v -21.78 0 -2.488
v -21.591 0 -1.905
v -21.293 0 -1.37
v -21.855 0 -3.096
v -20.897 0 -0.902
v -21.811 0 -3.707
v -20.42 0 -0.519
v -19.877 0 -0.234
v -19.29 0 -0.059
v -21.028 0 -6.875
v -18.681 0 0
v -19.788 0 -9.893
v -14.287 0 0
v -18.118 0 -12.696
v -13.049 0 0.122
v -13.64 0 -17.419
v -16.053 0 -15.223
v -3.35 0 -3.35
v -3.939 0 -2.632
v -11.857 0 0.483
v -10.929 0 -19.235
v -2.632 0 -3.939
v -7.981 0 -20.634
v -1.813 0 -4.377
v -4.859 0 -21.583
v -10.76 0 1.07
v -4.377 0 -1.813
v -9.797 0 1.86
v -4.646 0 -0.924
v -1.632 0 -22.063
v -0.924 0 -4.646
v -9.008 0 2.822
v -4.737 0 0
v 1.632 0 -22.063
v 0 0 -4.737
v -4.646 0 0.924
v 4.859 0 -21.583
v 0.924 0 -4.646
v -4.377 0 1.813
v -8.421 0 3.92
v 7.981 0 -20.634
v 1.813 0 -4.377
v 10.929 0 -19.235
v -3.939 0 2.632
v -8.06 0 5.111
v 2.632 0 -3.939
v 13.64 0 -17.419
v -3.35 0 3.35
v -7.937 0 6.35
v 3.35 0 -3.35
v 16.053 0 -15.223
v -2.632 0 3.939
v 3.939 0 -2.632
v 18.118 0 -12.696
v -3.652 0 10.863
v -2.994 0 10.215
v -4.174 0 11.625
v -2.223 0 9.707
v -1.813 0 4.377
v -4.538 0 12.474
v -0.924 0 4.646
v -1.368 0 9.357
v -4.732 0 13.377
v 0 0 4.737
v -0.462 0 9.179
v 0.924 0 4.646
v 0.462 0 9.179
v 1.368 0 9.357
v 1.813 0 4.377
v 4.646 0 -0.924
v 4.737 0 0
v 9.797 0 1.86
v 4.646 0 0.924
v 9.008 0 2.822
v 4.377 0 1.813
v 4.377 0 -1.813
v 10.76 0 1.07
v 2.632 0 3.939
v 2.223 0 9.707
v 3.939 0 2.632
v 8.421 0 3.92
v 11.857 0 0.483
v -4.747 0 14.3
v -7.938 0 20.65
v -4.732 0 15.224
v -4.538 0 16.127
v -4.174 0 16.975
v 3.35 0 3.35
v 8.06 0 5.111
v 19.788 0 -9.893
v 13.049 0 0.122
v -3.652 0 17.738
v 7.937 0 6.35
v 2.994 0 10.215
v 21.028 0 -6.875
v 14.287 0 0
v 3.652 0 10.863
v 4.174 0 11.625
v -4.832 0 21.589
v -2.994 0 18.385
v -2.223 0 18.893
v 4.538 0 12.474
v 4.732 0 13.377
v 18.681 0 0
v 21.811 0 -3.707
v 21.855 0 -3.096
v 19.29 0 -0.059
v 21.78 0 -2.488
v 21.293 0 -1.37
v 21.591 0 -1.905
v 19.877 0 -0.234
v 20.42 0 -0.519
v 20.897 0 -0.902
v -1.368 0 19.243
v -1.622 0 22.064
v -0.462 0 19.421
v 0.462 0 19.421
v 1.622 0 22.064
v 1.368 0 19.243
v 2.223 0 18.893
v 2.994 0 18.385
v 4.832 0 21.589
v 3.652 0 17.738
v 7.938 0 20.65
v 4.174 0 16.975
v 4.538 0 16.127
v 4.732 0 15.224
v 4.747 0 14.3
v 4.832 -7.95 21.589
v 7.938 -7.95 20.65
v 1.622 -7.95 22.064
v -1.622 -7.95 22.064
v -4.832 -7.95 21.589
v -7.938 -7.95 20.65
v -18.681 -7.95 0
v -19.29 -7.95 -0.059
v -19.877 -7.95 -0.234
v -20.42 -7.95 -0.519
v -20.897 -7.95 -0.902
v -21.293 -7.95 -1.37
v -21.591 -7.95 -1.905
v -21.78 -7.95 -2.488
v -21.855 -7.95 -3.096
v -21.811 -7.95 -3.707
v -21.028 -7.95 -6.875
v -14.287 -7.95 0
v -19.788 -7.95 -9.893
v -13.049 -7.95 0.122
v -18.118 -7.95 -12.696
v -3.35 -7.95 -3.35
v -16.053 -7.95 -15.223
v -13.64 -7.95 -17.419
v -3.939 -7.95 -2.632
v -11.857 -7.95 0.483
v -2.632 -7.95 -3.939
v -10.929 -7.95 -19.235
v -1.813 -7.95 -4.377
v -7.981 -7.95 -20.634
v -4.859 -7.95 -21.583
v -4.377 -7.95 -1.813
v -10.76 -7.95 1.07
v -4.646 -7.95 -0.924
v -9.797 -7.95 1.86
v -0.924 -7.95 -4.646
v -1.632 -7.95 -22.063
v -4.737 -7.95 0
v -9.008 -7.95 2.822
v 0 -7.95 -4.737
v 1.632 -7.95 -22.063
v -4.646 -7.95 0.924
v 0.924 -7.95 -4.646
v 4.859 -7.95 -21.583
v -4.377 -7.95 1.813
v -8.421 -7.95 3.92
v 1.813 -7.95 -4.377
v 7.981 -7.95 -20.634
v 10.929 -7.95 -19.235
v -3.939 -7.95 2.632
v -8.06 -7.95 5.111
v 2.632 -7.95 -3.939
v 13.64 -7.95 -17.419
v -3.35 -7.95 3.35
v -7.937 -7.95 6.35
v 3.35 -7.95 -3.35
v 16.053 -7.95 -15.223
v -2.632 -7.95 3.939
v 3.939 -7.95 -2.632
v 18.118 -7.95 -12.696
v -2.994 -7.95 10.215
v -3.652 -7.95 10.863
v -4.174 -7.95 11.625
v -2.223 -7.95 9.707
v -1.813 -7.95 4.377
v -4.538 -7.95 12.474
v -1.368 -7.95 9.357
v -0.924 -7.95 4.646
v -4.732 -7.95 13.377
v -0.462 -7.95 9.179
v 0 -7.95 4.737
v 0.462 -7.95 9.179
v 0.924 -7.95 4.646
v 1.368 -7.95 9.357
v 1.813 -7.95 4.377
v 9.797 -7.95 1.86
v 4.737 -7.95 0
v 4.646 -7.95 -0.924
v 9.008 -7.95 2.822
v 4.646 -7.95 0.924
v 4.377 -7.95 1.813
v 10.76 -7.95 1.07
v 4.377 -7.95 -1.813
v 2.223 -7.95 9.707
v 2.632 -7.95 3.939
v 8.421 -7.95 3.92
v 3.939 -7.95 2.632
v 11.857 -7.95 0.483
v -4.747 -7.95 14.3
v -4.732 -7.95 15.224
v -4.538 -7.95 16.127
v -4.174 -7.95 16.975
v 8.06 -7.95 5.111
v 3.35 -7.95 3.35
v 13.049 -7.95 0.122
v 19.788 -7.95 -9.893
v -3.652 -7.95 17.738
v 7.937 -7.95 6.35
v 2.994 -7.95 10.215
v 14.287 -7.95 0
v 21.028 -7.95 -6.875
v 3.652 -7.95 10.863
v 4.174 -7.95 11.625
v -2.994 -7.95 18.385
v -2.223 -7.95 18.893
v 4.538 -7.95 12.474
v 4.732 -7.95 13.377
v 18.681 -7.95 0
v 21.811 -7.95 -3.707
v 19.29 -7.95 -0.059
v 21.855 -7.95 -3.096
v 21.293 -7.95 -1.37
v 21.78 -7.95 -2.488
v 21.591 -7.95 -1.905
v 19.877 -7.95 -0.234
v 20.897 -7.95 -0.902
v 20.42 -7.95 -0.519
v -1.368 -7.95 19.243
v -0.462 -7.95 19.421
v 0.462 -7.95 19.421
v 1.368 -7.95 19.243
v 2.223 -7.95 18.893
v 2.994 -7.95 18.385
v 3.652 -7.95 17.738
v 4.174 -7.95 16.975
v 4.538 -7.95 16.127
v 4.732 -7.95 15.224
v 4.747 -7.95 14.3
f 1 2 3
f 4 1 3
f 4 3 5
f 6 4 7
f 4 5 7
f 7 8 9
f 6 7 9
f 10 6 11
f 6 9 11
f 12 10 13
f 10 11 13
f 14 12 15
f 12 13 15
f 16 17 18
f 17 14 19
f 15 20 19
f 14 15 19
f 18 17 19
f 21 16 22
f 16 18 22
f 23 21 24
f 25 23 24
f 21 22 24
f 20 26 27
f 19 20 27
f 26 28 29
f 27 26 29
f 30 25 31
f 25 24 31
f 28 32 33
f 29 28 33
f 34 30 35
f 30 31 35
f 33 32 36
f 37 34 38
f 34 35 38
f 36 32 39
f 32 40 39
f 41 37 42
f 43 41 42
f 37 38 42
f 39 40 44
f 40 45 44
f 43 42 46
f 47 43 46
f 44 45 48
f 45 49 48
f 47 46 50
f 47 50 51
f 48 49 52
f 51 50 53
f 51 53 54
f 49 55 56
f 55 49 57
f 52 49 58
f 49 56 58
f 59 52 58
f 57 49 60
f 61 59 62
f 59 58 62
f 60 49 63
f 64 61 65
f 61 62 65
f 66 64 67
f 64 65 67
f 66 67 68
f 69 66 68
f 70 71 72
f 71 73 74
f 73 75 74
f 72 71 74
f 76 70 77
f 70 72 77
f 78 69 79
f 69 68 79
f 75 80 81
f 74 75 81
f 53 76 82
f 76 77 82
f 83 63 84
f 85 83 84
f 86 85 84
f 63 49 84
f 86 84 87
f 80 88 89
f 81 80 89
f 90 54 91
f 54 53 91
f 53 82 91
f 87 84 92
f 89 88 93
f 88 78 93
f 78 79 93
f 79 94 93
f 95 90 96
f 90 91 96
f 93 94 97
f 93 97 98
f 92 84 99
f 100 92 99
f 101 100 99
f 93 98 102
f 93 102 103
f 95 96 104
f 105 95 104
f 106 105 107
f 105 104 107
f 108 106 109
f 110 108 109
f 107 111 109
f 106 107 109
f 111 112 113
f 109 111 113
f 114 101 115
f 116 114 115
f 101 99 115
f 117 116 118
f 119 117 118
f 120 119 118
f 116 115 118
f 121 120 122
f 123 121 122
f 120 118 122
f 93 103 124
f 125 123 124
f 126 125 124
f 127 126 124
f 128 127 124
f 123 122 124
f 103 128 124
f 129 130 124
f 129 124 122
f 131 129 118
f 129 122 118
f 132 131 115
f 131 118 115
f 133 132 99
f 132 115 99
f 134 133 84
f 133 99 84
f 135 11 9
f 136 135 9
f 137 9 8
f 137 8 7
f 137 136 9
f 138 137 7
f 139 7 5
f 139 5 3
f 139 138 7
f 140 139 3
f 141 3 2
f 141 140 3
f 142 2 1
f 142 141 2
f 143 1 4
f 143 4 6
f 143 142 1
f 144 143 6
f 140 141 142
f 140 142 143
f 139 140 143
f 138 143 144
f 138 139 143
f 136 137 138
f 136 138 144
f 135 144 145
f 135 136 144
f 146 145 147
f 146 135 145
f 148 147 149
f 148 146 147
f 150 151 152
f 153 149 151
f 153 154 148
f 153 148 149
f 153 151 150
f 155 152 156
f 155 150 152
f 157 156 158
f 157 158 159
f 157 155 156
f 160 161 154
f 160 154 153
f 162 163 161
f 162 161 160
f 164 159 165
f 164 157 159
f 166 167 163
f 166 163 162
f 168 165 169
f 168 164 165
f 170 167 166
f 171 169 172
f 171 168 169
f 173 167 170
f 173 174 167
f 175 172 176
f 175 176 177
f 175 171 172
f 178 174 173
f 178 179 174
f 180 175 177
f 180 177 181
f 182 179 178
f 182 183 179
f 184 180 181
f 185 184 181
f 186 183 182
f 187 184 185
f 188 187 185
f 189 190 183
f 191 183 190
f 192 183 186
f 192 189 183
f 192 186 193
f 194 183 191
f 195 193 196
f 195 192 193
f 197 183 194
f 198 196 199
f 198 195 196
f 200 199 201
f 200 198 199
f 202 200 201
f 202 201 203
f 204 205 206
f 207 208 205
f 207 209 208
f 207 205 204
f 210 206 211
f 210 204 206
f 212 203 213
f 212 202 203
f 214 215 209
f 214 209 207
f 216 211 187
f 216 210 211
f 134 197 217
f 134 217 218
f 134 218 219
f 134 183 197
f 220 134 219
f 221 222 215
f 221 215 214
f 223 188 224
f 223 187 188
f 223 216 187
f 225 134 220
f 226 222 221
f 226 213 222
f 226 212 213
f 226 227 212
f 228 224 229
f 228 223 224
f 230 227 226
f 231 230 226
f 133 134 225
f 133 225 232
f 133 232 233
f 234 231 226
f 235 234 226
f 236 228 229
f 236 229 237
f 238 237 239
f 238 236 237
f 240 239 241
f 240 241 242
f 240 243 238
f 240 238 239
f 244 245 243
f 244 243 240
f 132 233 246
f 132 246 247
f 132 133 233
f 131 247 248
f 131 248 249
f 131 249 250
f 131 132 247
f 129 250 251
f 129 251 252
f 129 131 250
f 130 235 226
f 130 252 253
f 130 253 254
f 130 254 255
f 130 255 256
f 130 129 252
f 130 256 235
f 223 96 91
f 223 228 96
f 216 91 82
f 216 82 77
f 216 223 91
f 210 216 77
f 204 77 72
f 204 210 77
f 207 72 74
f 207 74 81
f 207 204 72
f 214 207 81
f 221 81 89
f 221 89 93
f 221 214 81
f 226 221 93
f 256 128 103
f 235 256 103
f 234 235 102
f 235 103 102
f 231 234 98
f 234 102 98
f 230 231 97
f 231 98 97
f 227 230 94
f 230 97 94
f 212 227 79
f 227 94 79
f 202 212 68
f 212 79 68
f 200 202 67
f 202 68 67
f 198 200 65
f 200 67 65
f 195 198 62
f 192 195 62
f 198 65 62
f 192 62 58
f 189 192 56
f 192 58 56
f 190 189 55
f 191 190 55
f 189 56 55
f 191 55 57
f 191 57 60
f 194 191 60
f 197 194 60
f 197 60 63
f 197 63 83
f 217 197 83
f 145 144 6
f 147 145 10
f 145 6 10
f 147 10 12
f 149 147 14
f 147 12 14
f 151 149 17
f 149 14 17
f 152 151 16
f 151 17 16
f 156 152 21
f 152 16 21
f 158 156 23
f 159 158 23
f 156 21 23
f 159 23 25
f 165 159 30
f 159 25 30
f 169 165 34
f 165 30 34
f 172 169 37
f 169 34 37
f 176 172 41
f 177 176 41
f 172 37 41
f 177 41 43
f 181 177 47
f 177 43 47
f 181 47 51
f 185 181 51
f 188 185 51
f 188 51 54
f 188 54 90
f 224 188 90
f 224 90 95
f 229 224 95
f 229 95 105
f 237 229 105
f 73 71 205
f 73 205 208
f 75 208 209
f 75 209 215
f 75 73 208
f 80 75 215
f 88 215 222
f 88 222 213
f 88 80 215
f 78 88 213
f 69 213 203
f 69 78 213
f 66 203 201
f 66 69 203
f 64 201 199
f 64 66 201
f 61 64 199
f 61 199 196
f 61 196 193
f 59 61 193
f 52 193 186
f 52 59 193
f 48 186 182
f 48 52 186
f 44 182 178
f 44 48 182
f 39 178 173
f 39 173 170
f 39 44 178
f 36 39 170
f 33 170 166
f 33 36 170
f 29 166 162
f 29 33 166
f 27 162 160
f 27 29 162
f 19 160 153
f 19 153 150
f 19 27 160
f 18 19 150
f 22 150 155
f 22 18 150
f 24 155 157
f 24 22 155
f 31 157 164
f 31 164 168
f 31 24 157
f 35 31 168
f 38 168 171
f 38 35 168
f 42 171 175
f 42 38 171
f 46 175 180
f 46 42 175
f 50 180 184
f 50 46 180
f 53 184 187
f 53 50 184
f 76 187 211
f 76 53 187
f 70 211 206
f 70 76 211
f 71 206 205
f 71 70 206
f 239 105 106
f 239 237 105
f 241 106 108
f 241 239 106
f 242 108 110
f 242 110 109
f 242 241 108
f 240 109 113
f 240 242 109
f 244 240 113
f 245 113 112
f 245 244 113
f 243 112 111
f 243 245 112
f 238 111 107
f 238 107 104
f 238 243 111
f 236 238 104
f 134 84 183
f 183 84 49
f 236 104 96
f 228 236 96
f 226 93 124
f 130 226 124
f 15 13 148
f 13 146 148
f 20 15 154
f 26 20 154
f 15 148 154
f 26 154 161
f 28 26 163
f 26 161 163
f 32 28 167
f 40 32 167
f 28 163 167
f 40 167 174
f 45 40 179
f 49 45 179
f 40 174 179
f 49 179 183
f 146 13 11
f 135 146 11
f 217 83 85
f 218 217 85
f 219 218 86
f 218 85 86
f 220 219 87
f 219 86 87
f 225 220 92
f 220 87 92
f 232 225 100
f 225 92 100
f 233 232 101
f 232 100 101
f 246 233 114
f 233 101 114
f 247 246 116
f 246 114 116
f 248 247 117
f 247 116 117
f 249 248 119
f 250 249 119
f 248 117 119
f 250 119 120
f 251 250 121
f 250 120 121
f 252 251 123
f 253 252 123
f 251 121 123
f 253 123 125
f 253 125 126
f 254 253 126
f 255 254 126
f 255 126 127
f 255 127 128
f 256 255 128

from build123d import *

# Parameters (mm, degrees)
F0_R     = 4.7371
F1_DEPTH = 7.9502
F2_R     = 6.35
F3_R     = 3.175


with BuildPart() as f1:
    # F0 (on Front) → F1 (new body)
    with BuildSketch(Plane.XZ):
        with BuildLine():
            Line((-7.9375, 0), (-22.1234, 0))
            ThreePointArc((-22.1234, 0), (0, -22.1234), (22.1234, 0))
            Line((22.1234, 0), (7.9375, 0))
            Line((7.9375, 0), (7.9375, 20.650446))
            ThreePointArc((7.9375, 20.650446), (0, 22.1234), (-7.9375, 20.650446))
            Line((-7.9375, 20.650446), (-7.9375, 0))
        make_face()
        Circle(F0_R, mode=Mode.SUBTRACT)
        with BuildLine():
            ThreePointArc((-4.747236, 14.3002), (0, 19.4437), (4.747236, 14.3002))
            ThreePointArc((4.747236, 14.3002), (0, 9.1567), (-4.747236, 14.3002))
        make_face(mode=Mode.SUBTRACT)
    extrude(amount=F1_DEPTH)

    # F2
    f2_edges = [f1.edges().sort_by_distance(p)[0] for p in [
        (-7.9375, -3.9751, 0),
        (7.9375, -3.9751, 0),
    ]]
    fillet(f2_edges, radius=F2_R)

    # F3
    f3_edges = [f1.edges().sort_by_distance(p)[0] for p in [
        (22.1234, -3.9751, 0),
        (-22.1234, -3.9751, 0),
    ]]
    fillet(f3_edges, radius=F3_R)


solid = f1.part
